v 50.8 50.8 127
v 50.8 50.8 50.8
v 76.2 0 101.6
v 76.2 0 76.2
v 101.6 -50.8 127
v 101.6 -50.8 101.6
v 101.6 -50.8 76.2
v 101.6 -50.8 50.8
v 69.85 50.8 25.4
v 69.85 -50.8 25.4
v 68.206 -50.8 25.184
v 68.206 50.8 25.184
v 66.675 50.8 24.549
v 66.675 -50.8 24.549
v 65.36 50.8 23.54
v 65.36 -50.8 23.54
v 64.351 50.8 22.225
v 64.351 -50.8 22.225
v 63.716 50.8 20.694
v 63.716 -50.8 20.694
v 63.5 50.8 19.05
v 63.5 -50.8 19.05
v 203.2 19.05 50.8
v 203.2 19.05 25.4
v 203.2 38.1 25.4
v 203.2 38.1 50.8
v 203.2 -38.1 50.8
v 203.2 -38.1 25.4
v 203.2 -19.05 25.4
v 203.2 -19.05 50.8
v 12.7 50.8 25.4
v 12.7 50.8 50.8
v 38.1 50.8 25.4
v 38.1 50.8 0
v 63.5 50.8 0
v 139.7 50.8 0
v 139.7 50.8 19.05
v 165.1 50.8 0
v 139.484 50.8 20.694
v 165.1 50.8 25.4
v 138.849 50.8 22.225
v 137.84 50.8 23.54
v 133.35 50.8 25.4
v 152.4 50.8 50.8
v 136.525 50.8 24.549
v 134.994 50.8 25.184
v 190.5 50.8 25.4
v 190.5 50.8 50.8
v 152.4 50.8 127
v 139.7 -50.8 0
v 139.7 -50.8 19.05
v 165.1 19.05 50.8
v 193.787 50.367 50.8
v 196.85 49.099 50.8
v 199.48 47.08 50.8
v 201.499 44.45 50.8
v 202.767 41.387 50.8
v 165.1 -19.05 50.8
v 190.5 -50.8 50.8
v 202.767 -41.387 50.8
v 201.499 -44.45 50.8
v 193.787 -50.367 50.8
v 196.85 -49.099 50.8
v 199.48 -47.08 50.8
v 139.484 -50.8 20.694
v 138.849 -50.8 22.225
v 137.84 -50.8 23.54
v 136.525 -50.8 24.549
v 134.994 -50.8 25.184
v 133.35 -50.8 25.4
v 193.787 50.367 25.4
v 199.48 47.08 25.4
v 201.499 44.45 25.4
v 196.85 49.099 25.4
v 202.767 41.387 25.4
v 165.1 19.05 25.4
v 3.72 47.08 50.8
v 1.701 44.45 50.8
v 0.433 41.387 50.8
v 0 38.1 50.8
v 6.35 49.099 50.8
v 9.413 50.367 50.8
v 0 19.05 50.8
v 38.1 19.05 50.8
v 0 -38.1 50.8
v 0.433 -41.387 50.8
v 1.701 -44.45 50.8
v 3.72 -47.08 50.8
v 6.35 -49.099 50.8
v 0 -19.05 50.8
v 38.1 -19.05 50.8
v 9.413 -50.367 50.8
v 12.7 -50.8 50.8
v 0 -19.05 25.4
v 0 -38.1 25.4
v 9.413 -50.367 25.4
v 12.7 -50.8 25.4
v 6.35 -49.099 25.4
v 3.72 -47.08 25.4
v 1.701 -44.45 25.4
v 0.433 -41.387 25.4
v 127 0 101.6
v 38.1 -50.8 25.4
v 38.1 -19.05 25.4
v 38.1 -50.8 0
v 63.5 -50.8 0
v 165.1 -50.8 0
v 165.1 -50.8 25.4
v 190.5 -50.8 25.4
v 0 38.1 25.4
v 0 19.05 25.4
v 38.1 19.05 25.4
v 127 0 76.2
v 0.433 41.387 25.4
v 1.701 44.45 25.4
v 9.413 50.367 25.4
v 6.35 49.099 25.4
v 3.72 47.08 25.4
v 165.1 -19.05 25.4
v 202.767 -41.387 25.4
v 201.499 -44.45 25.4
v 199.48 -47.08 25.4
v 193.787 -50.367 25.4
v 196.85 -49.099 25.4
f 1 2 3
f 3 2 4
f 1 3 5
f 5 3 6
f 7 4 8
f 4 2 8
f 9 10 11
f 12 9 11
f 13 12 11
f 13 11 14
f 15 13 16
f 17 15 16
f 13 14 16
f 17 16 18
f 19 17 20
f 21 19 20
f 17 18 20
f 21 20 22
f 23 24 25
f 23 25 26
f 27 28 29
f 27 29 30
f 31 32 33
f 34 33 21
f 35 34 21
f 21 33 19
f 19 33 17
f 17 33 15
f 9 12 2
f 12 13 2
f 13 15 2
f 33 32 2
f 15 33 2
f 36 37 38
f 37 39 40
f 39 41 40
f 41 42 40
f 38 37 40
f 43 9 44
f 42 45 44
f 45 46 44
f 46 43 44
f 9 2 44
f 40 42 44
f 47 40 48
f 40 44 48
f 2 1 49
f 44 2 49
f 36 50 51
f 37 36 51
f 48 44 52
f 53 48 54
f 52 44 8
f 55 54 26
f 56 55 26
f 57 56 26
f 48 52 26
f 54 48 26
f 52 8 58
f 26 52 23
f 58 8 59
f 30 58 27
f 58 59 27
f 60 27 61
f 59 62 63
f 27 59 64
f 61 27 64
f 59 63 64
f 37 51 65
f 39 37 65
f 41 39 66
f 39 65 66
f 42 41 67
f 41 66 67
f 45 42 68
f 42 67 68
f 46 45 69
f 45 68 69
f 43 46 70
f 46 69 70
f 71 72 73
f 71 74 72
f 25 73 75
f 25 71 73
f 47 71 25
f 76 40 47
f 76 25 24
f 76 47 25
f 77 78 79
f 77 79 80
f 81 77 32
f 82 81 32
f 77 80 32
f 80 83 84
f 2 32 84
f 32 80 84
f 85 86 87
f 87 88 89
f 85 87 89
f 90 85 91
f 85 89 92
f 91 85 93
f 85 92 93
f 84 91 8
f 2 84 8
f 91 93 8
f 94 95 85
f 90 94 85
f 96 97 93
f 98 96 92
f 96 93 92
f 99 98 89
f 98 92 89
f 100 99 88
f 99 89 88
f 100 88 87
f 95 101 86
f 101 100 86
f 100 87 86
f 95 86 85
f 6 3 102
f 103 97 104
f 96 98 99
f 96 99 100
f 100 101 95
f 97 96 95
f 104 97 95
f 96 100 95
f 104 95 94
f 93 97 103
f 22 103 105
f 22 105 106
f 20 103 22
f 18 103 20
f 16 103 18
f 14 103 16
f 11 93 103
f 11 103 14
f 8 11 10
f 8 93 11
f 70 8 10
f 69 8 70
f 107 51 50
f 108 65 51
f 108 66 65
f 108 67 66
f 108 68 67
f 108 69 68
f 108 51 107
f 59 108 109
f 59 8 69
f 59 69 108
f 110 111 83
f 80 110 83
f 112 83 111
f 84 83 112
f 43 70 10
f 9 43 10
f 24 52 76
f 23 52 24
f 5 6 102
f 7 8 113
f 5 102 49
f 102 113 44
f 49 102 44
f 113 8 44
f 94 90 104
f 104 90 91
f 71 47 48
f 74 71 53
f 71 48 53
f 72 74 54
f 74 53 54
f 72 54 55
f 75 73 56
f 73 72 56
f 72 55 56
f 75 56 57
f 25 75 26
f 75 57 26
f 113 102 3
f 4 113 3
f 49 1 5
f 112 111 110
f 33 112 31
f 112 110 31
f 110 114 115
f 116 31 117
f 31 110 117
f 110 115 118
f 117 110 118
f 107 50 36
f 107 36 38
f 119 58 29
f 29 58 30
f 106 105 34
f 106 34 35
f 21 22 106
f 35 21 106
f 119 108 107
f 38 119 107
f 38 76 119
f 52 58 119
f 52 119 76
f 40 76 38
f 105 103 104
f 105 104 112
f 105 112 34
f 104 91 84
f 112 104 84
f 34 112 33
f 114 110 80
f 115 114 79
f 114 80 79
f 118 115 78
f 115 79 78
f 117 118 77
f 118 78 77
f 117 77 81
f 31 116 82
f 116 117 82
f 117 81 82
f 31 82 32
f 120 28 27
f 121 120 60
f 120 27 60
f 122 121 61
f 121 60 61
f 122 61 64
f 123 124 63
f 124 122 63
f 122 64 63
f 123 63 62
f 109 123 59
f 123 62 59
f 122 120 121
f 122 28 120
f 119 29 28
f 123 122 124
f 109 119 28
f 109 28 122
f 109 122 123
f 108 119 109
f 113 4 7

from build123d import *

# Parameters (mm, degrees)
F0_W      = 203.2
F0_H      = 50.8
F1_DEPTH  = 50.8
F2_W      = 38.1
F2_H      = 38.1
F3_DEPTH  = 50.801
F4_DEPTH  = 50.801
F5_W      = 101.6
F5_H      = 25.4
F6_DEPTH  = 38.1
F7_W      = 31.75
F7_H      = 25.4
F7_W_2    = 38.1
F8_DEPTH  = 38.1
F10_DEPTH = 101.601
F12_DEPTH = 50.801
F14_DEPTH = 76.2
F16_START = -25.4
F16_DEPTH = 25.4


with BuildPart() as f1:
    # F0 (on Front) → F1 (new body, symmetric)
    with BuildSketch(Plane.XZ):
        with Locations((101.6, 25.4)):
            Rectangle(F0_W, F0_H)
    extrude(amount=F1_DEPTH, both=True)

    # F2 (on face) → F3 (cut, through all)
    with BuildSketch(Plane.XY.offset(50.8)):
        with Locations((184.15, 0)):
            Rectangle(F2_W, F2_H)
    extrude(amount=-F3_DEPTH, mode=Mode.SUBTRACT)

    # F2 (on face) → F4 (cut, through all)
    with BuildSketch(Plane.XY.offset(50.8)):
        with Locations((19.05, 0)):
            Rectangle(F2_W, F2_H)
    extrude(amount=-F4_DEPTH, mode=Mode.SUBTRACT)

    # F5 (on Right) → F6 (cut)
    with BuildSketch(Plane.YZ):
        with Locations((0, 12.7)):
            Rectangle(F5_W, F5_H)
    extrude(amount=F6_DEPTH, mode=Mode.SUBTRACT)

    # F7 (on face) → F8 (cut)
    with BuildSketch(Plane.YZ.offset(165.1)):
        with Locations((34.925, 12.7)):
            Rectangle(F7_W, F7_H)
        with Locations((0, 12.7)):
            Rectangle(F7_W_2, F7_H)
        with Locations((-34.925, 12.7)):
            Rectangle(F7_W, F7_H)
    extrude(amount=F8_DEPTH, mode=Mode.SUBTRACT)

    # F9 (on face) → F10 (cut, through all)
    with BuildSketch(Plane.XZ.offset(50.8)):
        with BuildLine():
            Line((63.5, 19.0500015557), (63.5, 0))
            Line((63.5, 0), (139.7, 0))
            Line((139.7, 0), (139.7, 19.0500015557))
            ThreePointArc((139.7, 19.0500015557), (137.8401280605, 23.5401296162), (133.35, 25.4000015557))
            Line((133.35, 25.4000015557), (69.85, 25.4000015557))
            ThreePointArc((69.85, 25.4000015557), (65.3598719395, 23.5401296162), (63.5, 19.0500015557))
        make_face()
    extrude(amount=-F10_DEPTH, mode=Mode.SUBTRACT)

    # F11 (on face) → F12 (cut, through all)
    with BuildSketch(Plane.XY.offset(50.8)):
        with BuildLine():
            Line((0, 50.8), (0, 38.1))
            ThreePointArc((0, 38.1), (3.7197438789, 47.0802561211), (12.7, 50.8))
            Line((12.7, 50.8), (0, 50.8))
        make_face()
        with BuildLine():
            Line((0, -50.8), (12.7, -50.8))
            ThreePointArc((12.7, -50.8), (3.7197438789, -47.0802561211), (0, -38.1))
            Line((0, -38.1), (0, -50.8))
        make_face()
        with BuildLine():
            ThreePointArc((203.2, -38.1), (199.4802561211, -47.0802561211), (190.5, -50.8))
            Line((190.5, -50.8), (203.2, -50.8))
            Line((203.2, -50.8), (203.2, -38.1))
        make_face()
        with BuildLine():
            ThreePointArc((190.5, 50.8), (199.4802561211, 47.0802561211), (203.2, 38.1))
            Line((203.2, 38.1), (203.2, 50.8))
            Line((203.2, 50.8), (190.5, 50.8))
        make_face()
    extrude(amount=-F12_DEPTH, mode=Mode.SUBTRACT)

    # F13 (on face) → F14 (join)
    with BuildSketch(Plane.XY.offset(50.8)):
        Polygon((152.4, 50.8), (50.8, 50.8), (101.6, -50.8), align=None)
    extrude(amount=F14_DEPTH)

    # F15 (on face) → F16 (cut)
    with BuildSketch(Plane.XY.offset(127).offset(F16_START)):
        Polygon((101.6, -50.8), (127, 0), (76.2, 0), align=None)
    extrude(amount=-F16_DEPTH, mode=Mode.SUBTRACT)


solid = f1.part
